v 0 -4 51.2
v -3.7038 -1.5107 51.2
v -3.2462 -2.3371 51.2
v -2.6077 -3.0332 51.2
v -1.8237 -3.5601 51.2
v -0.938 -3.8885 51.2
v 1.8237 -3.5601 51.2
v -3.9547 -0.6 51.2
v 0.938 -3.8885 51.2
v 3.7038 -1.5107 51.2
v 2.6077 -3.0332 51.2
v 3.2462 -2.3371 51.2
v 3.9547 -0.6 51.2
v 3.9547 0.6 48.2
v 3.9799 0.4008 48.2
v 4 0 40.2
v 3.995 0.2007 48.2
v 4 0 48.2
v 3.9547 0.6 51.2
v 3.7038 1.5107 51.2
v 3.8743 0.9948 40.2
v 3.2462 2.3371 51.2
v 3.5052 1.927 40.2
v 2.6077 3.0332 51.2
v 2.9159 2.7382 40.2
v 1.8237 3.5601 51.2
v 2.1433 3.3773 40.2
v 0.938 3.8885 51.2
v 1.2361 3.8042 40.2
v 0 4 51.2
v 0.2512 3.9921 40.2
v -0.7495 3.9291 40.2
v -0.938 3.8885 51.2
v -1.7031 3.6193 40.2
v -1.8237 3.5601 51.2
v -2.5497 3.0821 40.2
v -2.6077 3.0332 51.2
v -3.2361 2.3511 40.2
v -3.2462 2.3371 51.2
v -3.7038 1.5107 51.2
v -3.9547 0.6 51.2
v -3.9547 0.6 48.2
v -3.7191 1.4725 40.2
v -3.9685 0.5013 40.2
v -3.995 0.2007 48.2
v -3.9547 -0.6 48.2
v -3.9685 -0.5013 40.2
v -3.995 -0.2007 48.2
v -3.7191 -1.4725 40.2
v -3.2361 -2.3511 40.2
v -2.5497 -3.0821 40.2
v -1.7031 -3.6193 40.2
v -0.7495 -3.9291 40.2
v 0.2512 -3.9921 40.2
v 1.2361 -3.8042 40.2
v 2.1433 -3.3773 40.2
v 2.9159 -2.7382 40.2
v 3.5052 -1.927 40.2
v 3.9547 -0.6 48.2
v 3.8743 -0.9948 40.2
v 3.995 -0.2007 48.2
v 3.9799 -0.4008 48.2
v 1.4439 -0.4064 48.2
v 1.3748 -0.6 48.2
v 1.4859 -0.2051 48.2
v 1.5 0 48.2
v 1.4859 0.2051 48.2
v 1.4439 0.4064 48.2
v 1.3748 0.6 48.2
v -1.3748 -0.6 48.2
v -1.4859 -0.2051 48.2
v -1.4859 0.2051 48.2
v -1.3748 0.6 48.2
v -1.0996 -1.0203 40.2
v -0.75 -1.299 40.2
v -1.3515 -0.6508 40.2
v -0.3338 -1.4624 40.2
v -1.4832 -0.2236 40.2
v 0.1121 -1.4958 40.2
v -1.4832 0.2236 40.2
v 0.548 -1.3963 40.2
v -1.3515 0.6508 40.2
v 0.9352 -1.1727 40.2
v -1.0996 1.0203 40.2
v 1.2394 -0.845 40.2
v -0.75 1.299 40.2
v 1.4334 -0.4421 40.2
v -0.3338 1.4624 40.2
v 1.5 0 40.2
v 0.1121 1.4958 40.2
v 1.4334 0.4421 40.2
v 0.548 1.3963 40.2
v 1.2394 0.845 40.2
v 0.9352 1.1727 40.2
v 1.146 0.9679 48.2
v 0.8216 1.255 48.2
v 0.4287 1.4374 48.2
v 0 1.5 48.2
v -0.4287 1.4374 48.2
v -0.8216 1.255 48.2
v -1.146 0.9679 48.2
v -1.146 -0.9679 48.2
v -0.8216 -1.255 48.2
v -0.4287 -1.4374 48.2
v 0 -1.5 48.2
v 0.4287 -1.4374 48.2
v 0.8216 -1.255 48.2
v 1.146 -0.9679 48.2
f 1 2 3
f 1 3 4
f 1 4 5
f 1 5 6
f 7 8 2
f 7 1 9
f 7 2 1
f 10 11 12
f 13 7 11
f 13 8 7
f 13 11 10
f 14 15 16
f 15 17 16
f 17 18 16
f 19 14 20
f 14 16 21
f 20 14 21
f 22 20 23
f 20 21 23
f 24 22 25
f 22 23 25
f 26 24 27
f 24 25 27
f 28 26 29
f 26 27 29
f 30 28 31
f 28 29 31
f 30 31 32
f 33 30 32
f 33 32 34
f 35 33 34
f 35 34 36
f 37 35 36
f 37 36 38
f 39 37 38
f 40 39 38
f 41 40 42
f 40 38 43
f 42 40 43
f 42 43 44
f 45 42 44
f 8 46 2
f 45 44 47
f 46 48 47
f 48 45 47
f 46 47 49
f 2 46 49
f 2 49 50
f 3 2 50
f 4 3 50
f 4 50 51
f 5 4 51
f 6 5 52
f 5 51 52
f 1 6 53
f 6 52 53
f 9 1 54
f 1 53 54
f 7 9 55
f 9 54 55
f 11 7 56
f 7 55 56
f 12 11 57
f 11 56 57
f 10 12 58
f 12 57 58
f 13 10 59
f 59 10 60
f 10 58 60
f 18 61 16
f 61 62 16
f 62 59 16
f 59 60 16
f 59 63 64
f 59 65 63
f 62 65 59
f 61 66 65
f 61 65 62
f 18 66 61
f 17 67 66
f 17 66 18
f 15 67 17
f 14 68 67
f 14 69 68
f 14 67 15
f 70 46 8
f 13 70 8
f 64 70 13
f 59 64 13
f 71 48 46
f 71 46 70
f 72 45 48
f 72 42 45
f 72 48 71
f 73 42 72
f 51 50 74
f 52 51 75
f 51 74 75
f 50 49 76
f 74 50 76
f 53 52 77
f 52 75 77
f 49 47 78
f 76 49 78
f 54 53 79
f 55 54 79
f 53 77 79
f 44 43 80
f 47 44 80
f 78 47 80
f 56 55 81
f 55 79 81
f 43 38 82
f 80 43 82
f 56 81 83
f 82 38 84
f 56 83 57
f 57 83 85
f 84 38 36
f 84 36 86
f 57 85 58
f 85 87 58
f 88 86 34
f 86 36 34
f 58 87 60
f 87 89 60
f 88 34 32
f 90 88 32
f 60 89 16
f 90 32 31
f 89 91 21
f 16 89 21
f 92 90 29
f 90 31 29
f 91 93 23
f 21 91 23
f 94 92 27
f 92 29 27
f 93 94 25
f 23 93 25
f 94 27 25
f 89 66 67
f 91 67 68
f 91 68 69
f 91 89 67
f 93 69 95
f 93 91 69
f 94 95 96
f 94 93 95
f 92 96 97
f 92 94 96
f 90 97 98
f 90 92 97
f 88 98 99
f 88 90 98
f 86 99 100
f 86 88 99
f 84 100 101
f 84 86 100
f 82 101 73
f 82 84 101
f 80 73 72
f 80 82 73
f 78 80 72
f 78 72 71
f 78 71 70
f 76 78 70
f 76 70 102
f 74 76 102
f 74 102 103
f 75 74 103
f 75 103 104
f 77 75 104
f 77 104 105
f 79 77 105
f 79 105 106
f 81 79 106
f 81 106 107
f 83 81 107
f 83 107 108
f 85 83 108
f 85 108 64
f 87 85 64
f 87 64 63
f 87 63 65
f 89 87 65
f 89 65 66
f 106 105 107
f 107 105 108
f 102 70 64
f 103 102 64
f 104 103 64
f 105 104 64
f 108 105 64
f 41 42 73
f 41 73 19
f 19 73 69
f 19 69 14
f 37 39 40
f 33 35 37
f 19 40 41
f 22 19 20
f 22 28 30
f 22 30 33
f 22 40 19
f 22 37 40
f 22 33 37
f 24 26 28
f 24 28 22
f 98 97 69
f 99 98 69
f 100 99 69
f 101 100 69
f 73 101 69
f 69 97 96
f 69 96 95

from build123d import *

# Parameters (mm, degrees)
BOX015_W          = 8.4
BOX015_H          = 1.2
BOX015_DEPTH      = 3
CYLINDER069_R     = 1.5
CYLINDER069_DEPTH = 8
CYLINDER064_R     = 4
CYLINDER064_DEPTH = 11


with BuildPart() as pick_slot:
    # Box015 → Box015 (new body)
    with BuildSketch(Plane(origin=(-4.2, -0.6, 8), x_dir=(1, 0, 0), z_dir=(0, 0, 1))):
        with Locations((4.2, 0.6)):
            Rectangle(BOX015_W, BOX015_H)
    extrude(amount=BOX015_DEPTH)


with BuildPart() as axis_hole:
    # Cylinder069 → Cylinder069 (new body)
    with BuildSketch(Plane.XY):
        Circle(CYLINDER069_R)
    extrude(amount=CYLINDER069_DEPTH)


with BuildPart() as pot_axis_ext:
    # Cylinder064 → Cylinder064 (new body)
    with BuildSketch(Plane.XY):
        Circle(CYLINDER064_R)
    extrude(amount=CYLINDER064_DEPTH)

    # Cut051: cut axis-hole
    add(axis_hole.part, mode=Mode.SUBTRACT)

    # Cut052: cut pick-slot
    add(pick_slot.part, mode=Mode.SUBTRACT)


with BuildPart() as pot_axis_ext_1:
    # Cut052 placement: moved
    add(pot_axis_ext.part.moved(Location((0, 0, 40.2))))


solid = pot_axis_ext_1.part
